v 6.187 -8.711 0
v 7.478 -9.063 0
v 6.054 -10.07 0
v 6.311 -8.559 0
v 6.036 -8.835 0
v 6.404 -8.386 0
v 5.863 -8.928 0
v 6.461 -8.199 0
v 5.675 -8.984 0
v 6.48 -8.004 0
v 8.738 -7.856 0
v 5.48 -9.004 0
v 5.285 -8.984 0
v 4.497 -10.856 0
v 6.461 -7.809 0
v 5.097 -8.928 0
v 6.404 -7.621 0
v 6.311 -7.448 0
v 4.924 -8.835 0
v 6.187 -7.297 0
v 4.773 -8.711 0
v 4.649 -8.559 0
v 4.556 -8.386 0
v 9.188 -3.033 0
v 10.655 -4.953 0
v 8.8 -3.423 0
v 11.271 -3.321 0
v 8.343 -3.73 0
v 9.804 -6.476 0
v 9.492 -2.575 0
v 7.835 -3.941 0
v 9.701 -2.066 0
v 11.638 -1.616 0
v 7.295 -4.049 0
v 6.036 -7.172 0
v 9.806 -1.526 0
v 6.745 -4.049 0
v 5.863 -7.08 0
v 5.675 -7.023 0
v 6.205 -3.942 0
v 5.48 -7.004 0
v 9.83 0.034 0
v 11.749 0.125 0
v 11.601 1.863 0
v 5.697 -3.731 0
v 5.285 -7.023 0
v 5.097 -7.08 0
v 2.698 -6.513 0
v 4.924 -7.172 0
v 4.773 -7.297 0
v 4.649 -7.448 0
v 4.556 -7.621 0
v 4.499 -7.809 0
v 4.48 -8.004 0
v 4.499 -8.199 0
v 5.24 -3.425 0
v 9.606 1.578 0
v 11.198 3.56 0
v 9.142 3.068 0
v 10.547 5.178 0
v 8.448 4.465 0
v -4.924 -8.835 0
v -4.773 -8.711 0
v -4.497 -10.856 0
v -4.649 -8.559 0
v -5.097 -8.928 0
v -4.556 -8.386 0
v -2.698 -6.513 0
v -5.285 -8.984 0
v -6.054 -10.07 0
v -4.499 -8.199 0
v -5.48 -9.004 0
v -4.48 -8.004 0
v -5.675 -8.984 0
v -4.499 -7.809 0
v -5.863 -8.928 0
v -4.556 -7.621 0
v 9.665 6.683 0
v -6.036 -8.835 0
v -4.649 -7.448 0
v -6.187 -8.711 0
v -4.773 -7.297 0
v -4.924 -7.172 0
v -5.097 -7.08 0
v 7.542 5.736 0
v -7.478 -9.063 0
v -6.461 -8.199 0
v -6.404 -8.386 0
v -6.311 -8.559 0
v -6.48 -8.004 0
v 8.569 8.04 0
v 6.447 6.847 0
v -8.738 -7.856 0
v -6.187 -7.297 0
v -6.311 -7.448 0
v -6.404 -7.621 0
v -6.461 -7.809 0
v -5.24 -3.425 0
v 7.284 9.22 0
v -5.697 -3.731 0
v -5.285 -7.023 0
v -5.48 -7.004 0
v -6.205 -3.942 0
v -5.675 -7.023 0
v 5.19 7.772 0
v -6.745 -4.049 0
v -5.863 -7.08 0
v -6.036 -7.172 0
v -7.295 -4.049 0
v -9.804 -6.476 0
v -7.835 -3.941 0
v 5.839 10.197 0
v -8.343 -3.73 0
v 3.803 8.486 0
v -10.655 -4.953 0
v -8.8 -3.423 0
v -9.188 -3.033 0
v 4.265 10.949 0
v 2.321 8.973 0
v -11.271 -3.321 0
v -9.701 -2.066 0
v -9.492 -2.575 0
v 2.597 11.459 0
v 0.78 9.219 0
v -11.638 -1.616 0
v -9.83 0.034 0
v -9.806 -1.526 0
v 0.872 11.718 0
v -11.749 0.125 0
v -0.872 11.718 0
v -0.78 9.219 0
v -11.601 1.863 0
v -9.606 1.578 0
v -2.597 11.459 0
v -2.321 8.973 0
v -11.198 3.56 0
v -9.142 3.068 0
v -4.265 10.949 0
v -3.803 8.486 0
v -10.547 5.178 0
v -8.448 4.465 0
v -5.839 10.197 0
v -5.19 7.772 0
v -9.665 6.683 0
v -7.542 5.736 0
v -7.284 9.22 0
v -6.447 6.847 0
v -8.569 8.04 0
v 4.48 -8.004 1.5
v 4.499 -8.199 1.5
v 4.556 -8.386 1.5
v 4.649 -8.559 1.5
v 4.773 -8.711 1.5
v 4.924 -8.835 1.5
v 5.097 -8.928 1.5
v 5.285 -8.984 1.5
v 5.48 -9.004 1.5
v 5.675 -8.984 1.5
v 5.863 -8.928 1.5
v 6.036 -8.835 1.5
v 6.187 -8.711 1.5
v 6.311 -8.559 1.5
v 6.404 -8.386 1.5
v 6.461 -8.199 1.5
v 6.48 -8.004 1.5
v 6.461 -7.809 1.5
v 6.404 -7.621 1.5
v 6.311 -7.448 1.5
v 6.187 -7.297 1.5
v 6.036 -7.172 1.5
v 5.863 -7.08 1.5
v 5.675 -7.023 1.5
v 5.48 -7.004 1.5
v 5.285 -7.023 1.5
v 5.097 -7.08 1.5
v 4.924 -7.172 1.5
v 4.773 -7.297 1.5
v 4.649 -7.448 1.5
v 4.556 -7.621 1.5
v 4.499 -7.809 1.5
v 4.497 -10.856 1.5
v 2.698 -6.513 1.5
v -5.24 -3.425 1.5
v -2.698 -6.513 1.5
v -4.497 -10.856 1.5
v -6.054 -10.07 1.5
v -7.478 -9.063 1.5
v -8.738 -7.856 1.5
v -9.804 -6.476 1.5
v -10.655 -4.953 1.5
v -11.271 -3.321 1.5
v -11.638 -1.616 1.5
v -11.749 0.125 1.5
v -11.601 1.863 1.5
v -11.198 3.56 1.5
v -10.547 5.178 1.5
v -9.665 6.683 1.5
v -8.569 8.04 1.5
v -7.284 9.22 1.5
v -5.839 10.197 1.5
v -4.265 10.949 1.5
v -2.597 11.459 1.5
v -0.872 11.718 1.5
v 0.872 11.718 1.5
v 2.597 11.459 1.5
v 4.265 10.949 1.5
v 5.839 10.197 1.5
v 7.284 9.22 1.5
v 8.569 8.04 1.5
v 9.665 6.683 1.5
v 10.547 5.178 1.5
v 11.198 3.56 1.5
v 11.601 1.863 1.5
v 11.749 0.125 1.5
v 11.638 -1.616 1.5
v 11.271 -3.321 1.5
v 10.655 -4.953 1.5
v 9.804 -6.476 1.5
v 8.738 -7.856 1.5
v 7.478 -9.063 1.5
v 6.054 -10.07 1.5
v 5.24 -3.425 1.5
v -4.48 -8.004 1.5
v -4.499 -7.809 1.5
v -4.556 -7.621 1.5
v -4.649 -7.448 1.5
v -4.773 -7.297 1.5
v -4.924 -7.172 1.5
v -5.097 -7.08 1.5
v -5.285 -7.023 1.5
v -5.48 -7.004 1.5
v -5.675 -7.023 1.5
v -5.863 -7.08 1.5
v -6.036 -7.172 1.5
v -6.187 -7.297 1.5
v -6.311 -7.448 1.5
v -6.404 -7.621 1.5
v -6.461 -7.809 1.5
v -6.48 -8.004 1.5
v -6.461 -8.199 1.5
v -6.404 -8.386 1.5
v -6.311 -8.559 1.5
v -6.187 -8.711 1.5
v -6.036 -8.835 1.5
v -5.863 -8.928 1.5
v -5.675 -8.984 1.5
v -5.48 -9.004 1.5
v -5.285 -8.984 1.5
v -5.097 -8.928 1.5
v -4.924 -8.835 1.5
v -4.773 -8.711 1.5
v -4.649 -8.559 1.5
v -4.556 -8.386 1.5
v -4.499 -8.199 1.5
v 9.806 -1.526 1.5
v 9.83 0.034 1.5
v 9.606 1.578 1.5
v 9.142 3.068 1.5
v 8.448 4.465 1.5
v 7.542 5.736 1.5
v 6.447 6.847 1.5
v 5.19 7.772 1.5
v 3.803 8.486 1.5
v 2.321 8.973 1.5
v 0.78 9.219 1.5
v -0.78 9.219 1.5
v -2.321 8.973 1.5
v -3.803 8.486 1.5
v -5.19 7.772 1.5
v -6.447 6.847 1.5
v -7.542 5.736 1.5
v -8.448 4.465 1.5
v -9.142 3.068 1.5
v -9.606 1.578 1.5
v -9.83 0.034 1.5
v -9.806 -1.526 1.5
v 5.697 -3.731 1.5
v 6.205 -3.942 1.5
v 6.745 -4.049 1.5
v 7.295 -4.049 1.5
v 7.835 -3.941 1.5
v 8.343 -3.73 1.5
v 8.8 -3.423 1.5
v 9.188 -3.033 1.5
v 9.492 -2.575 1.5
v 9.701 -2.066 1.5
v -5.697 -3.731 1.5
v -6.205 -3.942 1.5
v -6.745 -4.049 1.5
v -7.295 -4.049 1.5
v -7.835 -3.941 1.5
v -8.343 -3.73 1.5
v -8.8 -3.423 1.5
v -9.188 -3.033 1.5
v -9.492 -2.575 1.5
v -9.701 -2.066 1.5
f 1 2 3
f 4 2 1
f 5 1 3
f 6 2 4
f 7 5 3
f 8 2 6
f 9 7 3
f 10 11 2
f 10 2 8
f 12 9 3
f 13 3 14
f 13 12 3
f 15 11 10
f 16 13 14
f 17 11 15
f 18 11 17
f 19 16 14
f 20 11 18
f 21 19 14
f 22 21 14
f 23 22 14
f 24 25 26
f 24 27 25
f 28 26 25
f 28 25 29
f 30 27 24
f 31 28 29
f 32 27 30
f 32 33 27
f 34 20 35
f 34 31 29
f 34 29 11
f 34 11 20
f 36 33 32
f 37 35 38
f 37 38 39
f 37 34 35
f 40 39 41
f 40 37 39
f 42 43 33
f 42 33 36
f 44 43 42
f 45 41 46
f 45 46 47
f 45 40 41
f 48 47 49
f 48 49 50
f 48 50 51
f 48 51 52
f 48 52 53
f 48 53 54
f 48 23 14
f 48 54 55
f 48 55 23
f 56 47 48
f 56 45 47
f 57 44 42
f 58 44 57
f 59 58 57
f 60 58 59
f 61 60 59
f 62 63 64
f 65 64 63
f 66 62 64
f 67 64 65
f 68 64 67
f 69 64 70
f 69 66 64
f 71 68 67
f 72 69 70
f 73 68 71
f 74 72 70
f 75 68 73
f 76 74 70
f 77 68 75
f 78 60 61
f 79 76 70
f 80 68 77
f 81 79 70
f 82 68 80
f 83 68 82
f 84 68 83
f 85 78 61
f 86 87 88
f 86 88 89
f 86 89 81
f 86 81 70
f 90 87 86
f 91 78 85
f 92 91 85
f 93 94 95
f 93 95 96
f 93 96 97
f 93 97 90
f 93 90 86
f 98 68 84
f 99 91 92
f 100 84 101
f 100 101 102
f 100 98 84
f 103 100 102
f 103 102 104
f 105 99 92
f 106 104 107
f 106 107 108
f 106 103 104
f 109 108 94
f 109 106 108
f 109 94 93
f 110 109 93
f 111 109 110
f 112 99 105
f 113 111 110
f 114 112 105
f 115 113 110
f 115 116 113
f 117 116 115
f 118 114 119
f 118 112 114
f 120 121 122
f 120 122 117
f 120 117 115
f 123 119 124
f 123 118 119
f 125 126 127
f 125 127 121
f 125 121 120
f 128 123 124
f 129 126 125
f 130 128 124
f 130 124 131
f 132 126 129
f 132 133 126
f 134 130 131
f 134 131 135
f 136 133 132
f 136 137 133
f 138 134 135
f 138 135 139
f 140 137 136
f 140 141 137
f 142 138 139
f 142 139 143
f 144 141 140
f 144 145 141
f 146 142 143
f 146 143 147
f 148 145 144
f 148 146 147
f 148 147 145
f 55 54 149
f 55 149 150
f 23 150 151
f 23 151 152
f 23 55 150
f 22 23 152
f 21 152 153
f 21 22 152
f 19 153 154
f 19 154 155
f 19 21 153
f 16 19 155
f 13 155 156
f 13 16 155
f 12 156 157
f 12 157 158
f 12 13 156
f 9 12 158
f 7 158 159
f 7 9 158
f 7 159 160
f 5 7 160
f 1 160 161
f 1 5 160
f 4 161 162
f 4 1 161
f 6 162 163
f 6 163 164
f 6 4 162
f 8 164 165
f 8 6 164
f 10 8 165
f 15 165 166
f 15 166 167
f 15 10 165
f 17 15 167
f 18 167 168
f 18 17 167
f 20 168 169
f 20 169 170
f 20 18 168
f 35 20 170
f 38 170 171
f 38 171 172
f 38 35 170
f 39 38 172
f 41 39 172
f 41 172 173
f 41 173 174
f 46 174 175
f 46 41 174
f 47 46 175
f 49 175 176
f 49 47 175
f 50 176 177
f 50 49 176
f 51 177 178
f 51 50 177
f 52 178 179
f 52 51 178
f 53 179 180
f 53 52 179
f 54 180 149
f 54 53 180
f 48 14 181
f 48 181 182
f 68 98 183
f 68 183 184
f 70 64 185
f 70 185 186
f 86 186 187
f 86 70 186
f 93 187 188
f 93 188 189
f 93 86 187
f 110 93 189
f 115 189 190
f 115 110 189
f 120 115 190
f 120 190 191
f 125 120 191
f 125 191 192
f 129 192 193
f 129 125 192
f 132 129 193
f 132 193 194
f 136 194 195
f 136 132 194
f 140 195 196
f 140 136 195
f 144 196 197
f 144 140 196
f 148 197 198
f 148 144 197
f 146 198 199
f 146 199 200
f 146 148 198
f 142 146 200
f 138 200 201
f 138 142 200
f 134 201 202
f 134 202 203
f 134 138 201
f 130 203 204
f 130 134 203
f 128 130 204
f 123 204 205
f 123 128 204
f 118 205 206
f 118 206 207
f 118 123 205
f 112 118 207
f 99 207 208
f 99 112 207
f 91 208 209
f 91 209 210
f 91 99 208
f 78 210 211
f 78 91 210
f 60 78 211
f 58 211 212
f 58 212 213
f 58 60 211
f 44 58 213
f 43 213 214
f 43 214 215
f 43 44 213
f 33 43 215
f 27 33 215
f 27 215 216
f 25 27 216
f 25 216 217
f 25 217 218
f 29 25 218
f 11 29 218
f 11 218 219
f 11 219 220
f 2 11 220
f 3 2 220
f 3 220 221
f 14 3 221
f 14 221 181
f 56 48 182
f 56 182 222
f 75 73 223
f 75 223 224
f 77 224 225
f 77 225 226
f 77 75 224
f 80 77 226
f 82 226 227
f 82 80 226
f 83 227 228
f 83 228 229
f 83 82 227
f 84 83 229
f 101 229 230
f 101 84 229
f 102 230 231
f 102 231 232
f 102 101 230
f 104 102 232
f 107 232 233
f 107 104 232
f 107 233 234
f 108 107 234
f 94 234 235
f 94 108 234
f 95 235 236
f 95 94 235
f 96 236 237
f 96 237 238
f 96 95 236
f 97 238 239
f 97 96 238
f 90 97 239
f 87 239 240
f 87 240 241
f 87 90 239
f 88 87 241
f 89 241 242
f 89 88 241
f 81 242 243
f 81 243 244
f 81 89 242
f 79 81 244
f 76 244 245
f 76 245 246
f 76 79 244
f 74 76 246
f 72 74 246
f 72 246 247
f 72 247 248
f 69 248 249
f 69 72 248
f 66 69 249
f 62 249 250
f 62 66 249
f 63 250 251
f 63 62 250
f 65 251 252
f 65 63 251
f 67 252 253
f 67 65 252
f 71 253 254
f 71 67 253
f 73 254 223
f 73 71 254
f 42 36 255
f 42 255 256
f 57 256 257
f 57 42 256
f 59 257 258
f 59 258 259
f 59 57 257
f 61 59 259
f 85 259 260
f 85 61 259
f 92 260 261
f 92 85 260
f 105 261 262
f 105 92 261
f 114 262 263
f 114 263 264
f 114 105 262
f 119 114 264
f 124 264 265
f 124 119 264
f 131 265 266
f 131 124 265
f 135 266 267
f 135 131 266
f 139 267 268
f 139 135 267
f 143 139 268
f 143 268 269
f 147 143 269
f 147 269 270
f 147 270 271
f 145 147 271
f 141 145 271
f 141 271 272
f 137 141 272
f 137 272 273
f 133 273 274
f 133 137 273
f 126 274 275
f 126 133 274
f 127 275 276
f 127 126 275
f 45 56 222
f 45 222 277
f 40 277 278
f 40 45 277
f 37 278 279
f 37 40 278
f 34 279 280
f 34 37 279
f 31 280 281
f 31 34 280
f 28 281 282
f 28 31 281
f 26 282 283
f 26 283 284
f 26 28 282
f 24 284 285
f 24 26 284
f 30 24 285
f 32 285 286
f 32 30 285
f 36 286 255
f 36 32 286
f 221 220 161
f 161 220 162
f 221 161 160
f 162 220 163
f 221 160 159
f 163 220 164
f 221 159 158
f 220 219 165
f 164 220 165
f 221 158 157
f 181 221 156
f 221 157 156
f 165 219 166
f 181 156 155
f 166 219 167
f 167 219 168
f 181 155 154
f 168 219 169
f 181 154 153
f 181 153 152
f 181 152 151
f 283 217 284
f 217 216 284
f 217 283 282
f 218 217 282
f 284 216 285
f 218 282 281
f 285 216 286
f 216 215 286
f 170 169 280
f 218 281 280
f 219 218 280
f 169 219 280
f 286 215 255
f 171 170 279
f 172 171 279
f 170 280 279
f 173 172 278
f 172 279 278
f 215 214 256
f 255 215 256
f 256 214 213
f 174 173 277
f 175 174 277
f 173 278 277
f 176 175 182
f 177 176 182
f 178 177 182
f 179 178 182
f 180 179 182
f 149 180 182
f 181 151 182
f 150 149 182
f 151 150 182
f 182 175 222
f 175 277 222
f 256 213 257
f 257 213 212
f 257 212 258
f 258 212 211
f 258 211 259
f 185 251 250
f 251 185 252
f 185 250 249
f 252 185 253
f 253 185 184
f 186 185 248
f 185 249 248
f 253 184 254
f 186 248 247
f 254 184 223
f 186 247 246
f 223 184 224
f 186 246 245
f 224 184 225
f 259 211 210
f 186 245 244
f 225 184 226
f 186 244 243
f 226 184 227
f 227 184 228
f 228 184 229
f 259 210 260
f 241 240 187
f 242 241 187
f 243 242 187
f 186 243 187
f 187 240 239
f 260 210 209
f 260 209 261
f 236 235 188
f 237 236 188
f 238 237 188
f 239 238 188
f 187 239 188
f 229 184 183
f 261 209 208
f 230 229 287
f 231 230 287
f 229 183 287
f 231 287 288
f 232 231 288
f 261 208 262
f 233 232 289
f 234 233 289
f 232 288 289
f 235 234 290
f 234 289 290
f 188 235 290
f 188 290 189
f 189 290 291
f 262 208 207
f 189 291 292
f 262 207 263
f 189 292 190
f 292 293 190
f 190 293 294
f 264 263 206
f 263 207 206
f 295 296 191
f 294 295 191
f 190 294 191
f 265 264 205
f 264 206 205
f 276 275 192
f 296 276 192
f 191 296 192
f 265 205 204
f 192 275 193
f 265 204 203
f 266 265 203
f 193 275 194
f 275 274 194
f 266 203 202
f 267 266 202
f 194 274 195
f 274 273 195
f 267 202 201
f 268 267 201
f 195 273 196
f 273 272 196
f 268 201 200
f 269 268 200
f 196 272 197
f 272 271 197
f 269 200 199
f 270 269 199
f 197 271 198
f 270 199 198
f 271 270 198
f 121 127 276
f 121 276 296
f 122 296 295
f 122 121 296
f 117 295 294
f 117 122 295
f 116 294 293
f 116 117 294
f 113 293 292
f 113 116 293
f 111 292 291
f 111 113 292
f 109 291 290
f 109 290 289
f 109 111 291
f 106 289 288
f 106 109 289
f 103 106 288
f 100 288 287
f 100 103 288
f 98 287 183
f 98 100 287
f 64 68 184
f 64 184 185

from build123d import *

# Parameters (mm, degrees)
SKETCH_1_R        = 1
EXTRUDE_831_DEPTH = 1.5


with BuildPart() as part:
    # 草图1 → Extrude 831 (new body)
    with BuildSketch(Plane.XY):
        with BuildLine():
            Line((-5.239607816, -3.42469179), (-2.697918198, -6.513350704))
            Line((-2.697918198, -6.513350704), (-4.49653033, -10.855584507))
            ThreePointArc((-4.49653033, -10.855584507), (0, 11.75), (4.49653033, -10.855584507))
            Line((4.49653033, -10.855584507), (2.697918198, -6.513350704))
            Line((2.697918198, -6.513350704), (5.239607816, -3.42469179))
            ThreePointArc((5.239607816, -3.42469179), (8.093813076, -3.84803701), (9.806395304, -1.525802967))
            ThreePointArc((9.806395304, -1.525802967), (0, 9.25), (-9.806395304, -1.525802967))
            ThreePointArc((-9.806395304, -1.525802967), (-8.093813076, -3.84803701), (-5.239607816, -3.42469179))
        make_face()
        with Locations((-5.480027646, -8.003705205)):
            Circle(SKETCH_1_R, mode=Mode.SUBTRACT)
        with Locations(Location((5.480027646, -8.003705205, 0), (0, 0, 180))):
            Circle(SKETCH_1_R, mode=Mode.SUBTRACT)
    extrude(amount=EXTRUDE_831_DEPTH)


solid = part.part
